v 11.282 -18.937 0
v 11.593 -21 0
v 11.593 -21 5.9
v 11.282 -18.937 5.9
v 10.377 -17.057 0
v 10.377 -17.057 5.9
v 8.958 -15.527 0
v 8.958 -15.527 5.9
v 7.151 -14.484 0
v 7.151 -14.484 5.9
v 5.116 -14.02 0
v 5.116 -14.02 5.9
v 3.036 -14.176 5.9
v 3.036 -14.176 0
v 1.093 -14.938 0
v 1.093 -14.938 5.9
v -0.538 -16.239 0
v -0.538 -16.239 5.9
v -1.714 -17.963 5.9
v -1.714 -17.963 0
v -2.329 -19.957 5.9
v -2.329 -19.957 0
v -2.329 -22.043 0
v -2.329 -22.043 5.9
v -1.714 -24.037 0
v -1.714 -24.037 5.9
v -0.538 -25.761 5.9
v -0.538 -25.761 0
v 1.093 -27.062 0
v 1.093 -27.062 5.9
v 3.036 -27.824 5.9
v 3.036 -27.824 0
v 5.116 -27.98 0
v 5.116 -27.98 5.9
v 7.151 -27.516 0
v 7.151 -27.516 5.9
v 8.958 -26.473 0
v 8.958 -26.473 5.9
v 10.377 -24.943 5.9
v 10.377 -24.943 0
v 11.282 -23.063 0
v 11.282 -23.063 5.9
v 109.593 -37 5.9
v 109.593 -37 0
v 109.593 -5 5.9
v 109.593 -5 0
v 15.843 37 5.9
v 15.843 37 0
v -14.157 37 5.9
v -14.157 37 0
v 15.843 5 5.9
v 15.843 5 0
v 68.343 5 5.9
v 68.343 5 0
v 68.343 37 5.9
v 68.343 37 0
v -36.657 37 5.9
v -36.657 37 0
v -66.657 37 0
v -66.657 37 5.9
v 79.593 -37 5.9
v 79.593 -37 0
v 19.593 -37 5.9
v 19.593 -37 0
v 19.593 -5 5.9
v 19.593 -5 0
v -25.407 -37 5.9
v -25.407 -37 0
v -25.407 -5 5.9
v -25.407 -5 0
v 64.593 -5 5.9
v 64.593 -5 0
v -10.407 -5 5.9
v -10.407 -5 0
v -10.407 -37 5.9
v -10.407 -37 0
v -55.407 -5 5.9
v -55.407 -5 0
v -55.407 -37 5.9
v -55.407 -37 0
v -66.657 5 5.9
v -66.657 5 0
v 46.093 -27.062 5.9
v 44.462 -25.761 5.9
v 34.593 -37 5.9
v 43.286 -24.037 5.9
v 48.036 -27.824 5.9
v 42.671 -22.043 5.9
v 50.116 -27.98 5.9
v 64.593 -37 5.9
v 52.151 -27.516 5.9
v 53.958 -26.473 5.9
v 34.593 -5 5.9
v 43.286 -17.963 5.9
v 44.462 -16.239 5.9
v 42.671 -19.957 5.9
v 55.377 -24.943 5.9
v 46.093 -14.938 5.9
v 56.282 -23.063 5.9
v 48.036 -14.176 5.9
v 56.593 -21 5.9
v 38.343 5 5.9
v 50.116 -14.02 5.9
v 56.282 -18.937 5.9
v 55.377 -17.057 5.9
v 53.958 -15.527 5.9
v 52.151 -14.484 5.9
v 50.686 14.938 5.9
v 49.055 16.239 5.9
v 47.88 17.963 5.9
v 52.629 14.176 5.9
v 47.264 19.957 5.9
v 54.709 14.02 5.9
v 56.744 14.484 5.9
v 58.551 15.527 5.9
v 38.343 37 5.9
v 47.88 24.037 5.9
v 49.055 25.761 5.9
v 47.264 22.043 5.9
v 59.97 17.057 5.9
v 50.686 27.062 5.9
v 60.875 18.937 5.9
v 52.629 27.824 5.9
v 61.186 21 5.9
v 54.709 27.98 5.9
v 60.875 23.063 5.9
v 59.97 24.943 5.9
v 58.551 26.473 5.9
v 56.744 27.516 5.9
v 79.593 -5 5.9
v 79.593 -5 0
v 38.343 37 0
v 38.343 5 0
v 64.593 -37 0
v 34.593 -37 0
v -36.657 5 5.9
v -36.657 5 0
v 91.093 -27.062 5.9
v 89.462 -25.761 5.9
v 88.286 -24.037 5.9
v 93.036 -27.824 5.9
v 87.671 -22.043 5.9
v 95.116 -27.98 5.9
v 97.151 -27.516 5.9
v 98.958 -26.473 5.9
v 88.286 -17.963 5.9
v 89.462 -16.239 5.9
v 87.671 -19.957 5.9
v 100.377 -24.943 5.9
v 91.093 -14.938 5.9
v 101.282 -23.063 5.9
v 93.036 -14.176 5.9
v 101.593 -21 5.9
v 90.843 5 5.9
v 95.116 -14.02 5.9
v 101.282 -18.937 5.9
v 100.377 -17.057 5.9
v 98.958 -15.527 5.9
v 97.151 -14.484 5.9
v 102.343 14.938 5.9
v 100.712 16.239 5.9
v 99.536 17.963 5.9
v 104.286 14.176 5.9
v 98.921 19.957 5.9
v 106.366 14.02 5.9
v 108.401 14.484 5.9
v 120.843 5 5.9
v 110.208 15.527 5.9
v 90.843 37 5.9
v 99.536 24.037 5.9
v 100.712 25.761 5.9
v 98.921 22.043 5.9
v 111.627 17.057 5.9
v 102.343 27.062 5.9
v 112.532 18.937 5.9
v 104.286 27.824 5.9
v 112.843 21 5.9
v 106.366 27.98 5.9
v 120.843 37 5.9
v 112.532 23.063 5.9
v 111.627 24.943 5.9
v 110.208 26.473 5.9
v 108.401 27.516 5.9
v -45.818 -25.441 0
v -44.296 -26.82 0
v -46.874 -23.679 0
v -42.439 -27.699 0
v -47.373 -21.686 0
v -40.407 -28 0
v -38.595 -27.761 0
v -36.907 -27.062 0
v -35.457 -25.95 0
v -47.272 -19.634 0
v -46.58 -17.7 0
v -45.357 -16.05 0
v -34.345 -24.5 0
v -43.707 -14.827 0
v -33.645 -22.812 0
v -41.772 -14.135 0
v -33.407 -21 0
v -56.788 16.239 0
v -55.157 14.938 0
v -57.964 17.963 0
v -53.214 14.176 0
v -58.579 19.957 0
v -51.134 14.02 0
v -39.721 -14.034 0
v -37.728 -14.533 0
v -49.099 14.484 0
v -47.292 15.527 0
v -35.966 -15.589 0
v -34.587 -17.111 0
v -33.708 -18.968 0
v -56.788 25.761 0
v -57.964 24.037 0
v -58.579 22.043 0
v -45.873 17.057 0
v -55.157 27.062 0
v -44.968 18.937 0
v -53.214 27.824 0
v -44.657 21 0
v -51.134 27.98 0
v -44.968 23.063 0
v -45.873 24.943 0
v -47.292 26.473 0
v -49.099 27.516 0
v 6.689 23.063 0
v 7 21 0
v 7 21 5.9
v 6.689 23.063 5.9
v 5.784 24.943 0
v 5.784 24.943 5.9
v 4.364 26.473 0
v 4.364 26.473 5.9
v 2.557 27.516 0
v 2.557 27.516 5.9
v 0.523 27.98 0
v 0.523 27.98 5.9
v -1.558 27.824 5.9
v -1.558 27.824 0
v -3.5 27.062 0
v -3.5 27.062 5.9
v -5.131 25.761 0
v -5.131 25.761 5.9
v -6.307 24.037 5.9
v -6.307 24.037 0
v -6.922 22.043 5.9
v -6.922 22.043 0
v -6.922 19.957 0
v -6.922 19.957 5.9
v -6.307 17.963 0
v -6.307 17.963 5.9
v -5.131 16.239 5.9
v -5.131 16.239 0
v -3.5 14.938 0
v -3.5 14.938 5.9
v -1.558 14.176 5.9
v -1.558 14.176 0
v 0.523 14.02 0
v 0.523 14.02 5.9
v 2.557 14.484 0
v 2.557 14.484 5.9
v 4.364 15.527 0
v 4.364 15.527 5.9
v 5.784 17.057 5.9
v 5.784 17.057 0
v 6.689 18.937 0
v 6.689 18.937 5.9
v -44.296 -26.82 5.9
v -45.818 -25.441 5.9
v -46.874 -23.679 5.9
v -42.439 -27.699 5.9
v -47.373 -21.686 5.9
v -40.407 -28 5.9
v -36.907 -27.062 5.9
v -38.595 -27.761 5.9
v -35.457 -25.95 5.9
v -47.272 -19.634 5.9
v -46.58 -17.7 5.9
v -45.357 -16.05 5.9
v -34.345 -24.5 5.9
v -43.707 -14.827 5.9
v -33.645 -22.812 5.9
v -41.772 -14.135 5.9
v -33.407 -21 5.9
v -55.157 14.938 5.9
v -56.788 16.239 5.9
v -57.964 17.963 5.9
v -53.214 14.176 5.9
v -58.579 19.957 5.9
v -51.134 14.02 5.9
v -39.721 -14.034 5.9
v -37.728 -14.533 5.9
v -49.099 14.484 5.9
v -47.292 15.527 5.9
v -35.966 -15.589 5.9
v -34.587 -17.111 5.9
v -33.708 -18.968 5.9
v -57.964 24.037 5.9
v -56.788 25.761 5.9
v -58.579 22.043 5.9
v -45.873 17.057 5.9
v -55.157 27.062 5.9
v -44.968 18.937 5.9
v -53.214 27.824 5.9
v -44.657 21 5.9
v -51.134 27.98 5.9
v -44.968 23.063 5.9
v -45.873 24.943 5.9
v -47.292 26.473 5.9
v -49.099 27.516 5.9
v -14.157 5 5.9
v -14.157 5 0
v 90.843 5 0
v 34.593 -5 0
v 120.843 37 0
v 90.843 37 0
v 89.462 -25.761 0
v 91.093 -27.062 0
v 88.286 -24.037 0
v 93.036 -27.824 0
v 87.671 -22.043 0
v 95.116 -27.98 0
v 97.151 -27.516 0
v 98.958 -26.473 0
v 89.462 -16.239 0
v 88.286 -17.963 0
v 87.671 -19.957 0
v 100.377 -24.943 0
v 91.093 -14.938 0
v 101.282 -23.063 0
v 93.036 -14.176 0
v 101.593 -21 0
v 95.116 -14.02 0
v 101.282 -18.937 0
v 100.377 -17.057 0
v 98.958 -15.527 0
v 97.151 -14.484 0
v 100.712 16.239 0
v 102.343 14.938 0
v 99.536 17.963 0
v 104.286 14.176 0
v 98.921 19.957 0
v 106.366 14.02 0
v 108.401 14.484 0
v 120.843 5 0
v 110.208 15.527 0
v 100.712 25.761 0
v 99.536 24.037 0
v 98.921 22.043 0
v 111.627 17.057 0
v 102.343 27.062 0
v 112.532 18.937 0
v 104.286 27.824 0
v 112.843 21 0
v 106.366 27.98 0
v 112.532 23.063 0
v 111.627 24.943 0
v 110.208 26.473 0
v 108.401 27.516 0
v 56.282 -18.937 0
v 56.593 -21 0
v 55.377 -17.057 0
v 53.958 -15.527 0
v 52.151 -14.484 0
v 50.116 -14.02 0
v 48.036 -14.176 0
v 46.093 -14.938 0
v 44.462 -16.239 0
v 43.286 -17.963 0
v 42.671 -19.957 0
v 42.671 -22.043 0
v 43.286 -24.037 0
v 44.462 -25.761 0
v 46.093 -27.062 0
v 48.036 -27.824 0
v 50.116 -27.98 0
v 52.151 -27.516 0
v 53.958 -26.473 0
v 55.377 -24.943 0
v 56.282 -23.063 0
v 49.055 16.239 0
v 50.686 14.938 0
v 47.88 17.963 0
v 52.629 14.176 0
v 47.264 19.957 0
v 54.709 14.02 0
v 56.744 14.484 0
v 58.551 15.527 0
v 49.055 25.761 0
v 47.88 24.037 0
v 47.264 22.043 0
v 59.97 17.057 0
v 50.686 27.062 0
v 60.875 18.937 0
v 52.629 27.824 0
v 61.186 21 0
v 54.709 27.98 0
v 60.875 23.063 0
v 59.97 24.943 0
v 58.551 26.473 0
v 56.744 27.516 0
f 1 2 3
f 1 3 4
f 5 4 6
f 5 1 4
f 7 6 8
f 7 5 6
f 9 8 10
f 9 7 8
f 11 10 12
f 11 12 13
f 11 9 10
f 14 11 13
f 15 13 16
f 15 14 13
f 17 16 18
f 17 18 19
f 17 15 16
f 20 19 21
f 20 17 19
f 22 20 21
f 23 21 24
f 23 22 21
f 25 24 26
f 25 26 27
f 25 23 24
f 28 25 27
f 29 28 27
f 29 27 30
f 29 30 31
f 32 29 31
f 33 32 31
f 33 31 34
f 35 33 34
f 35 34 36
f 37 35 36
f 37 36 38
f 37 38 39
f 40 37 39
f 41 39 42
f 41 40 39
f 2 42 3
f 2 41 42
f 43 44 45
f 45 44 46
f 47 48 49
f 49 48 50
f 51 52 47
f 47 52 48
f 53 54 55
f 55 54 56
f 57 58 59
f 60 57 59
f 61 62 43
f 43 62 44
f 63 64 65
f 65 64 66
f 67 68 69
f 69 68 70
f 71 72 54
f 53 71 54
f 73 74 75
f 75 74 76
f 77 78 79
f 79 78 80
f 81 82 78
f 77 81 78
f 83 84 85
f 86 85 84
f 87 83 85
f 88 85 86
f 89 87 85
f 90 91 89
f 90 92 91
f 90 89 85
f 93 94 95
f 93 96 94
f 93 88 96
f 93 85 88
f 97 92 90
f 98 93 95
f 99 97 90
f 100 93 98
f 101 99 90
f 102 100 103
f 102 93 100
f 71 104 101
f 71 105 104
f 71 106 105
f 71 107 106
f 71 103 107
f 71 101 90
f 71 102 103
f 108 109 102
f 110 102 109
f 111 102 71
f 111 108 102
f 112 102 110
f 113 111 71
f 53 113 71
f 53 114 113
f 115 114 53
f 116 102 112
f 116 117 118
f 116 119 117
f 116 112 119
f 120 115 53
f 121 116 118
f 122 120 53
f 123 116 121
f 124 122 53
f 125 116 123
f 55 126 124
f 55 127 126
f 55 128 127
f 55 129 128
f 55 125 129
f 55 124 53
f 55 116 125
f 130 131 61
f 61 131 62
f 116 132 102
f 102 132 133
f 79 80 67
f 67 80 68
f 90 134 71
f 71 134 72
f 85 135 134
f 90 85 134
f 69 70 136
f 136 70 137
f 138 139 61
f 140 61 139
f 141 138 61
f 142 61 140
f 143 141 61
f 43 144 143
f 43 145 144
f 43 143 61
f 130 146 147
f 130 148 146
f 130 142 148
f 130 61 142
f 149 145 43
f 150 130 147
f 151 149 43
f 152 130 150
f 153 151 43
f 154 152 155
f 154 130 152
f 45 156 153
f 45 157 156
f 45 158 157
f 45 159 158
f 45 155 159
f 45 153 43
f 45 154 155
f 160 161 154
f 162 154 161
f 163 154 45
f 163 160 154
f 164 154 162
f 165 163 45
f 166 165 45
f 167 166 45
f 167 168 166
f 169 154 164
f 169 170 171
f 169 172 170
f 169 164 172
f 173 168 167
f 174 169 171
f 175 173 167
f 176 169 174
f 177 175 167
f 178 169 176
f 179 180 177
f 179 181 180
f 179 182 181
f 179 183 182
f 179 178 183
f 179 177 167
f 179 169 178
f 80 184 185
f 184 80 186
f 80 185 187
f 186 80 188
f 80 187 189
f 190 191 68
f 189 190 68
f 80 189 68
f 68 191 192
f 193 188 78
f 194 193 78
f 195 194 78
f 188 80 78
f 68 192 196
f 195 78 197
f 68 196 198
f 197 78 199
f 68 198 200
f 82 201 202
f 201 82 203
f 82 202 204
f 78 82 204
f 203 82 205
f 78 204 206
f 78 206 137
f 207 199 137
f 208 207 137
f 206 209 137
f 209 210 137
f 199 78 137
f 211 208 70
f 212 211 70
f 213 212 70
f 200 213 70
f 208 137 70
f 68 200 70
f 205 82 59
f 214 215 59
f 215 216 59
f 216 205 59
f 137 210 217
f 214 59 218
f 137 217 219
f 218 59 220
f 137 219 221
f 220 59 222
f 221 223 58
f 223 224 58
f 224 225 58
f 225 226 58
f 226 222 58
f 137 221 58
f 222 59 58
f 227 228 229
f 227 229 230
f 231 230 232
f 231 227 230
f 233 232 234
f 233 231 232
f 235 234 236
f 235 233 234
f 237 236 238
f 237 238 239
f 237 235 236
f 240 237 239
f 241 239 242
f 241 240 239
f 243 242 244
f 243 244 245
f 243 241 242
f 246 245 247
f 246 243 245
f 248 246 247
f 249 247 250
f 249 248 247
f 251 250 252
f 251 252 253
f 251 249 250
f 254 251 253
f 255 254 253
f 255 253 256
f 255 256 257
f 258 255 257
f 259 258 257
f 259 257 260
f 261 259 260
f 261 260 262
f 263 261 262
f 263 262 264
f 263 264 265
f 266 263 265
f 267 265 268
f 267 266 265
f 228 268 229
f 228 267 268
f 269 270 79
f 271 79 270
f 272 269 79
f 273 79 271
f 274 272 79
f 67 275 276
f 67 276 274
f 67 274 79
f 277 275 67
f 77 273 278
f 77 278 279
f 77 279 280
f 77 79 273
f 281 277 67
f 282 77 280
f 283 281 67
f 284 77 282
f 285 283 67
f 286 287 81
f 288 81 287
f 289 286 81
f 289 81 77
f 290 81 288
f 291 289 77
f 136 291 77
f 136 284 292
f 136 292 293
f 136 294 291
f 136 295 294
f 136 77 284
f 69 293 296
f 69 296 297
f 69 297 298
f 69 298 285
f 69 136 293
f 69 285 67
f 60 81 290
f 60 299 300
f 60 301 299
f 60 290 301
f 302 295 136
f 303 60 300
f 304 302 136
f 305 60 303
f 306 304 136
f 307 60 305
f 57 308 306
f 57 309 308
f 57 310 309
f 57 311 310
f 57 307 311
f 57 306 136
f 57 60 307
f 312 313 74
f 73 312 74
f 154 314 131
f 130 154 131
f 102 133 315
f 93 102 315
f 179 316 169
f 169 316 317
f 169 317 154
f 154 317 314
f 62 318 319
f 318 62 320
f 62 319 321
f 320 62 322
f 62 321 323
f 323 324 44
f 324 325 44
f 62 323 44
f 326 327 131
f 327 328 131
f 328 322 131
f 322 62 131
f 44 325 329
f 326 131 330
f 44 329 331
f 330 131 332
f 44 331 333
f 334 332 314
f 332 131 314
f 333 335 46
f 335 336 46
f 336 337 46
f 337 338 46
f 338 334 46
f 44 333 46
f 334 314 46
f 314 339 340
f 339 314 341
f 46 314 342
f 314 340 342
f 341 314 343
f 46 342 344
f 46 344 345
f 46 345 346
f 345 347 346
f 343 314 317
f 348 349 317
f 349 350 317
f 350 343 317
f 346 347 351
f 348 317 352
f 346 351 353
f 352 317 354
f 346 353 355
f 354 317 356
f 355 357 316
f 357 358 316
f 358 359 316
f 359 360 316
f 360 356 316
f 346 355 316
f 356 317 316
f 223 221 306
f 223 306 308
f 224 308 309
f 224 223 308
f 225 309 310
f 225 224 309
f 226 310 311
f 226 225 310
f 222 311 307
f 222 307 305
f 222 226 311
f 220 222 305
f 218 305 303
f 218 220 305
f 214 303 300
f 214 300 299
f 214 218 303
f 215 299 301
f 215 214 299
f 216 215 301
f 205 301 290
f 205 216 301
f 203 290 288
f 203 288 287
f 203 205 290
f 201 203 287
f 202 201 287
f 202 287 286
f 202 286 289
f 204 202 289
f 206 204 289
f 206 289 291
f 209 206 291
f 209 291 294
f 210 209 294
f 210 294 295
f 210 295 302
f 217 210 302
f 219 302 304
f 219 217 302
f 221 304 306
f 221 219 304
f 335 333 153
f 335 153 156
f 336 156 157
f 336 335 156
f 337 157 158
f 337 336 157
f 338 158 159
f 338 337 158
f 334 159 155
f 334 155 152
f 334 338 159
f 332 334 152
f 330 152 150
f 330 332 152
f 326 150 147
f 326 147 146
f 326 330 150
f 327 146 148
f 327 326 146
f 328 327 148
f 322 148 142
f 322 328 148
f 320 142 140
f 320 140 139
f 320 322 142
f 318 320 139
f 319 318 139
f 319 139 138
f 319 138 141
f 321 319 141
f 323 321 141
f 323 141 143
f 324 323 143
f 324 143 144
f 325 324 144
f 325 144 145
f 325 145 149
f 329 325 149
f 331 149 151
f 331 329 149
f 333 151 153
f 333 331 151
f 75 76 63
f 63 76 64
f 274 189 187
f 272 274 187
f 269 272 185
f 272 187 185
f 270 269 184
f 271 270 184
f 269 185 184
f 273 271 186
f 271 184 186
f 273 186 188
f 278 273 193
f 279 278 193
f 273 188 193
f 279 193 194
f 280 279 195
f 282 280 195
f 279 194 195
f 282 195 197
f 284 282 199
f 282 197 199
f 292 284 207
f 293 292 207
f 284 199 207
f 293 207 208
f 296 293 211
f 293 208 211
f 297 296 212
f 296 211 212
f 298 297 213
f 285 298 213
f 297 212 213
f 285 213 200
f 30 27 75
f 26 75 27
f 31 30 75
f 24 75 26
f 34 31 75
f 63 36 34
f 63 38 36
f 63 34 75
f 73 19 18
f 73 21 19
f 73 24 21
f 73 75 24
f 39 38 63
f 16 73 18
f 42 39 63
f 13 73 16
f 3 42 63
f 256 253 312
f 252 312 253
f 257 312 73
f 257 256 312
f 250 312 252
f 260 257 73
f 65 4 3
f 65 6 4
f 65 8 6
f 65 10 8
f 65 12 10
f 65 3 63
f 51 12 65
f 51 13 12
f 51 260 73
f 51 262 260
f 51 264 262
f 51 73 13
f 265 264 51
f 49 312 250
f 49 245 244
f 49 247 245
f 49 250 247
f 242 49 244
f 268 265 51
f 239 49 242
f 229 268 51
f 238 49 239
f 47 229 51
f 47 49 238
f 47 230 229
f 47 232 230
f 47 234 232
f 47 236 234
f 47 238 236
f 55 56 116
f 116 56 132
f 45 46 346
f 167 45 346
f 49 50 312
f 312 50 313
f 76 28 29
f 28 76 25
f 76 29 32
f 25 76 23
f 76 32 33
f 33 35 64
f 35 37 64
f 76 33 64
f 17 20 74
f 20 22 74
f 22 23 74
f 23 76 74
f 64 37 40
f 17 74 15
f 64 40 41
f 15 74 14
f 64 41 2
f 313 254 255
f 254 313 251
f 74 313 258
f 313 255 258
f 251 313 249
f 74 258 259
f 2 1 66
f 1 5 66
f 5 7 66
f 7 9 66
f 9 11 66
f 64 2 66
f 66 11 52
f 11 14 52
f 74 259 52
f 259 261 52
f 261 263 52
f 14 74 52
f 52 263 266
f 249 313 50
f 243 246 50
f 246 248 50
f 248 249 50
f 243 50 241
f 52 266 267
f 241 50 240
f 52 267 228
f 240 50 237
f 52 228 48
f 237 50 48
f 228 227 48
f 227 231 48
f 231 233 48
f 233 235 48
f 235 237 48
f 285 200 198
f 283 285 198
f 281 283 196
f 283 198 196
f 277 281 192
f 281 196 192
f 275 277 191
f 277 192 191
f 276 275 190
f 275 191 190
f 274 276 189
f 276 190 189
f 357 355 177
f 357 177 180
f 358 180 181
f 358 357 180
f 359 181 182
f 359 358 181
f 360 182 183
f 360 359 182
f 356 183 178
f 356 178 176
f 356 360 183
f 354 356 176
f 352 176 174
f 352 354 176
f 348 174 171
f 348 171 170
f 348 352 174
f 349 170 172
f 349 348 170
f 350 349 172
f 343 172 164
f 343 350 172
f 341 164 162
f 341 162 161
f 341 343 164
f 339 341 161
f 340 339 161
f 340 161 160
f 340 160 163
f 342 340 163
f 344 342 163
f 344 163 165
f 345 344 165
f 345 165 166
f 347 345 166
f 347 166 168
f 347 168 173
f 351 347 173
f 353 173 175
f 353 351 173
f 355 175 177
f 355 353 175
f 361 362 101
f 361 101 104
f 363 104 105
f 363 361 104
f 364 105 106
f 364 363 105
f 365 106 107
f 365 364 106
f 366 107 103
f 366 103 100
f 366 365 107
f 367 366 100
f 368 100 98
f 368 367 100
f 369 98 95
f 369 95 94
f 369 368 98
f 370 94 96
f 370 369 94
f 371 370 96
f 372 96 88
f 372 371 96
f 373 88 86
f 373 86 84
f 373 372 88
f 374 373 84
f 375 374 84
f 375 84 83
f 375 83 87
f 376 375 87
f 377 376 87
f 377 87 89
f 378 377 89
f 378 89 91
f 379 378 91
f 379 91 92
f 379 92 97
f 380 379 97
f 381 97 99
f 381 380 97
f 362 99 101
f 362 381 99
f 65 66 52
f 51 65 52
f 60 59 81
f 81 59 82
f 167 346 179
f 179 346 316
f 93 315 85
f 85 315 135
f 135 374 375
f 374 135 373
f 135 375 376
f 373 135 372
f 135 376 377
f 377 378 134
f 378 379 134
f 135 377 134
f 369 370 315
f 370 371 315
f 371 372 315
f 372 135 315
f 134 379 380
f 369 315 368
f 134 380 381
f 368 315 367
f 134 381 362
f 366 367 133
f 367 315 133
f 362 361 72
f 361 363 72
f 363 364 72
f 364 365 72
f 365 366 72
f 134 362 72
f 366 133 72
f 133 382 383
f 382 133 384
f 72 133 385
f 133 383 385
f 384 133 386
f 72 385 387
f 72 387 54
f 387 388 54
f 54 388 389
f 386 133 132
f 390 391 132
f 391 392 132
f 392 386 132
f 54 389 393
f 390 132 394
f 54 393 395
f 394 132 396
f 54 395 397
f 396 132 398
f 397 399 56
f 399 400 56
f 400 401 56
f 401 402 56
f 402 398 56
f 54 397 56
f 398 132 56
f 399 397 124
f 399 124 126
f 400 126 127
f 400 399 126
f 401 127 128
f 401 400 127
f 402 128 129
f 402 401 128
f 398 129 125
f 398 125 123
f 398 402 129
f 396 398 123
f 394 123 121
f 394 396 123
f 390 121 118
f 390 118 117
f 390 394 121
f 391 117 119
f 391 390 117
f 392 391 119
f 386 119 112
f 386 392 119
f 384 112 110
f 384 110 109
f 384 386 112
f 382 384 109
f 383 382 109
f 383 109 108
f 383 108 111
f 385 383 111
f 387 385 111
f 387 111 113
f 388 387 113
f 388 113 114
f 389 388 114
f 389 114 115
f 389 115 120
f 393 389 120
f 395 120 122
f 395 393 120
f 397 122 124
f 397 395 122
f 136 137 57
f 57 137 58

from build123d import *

# Parameters (mm, degrees)
F0_R     = 7
F1_DEPTH = 5.9


with BuildPart() as f1:
    # F0 (on Top) → F1 (new body)
    with BuildSketch(Plane.XY):
        Polygon((-36.656843, 5), (-36.656843, 37), (-66.656843, 37), (-66.656843, 5), (-55.406843, -5), (-55.406843, -37), (-40.406843, -37), (-25.406843, -37), (-25.406843, -5), align=None)
        with BuildLine():
            ThreePointArc((-33.406843, -21), (-35.457095, -25.949747), (-40.406843, -28))
            ThreePointArc((-40.406843, -28), (-45.35659, -16.050253), (-33.406843, -21))
        make_face(mode=Mode.SUBTRACT)
        with Locations((-51.656843, 21)):
            Circle(F0_R, mode=Mode.SUBTRACT)
        Polygon((15.843157, 5), (15.843157, 37), (-14.156843, 37), (-14.156843, 5), (-10.406843, -5), (-10.406843, -37), (19.593157, -37), (19.593157, -5), align=None)
        with Locations((4.593157, -21)):
            Circle(F0_R, mode=Mode.SUBTRACT)
        with Locations((0, 21)):
            Circle(F0_R, mode=Mode.SUBTRACT)
        Polygon((68.343157, 5), (68.343157, 37), (38.343157, 37), (38.343157, 5), (34.593157, -5), (34.593157, -37), (64.593157, -37), (64.593157, -5), align=None)
        with Locations((49.593157, -21)):
            Circle(F0_R, mode=Mode.SUBTRACT)
        with Locations((54.186315, 21)):
            Circle(F0_R, mode=Mode.SUBTRACT)
        Polygon((120.843157, 37), (90.843157, 37), (90.843157, 5), (79.593157, -5), (79.593157, -37), (109.593157, -37), (109.593157, -5), (120.843157, 5), align=None)
        with Locations((94.593157, -21)):
            Circle(F0_R, mode=Mode.SUBTRACT)
        with Locations((105.843157, 21)):
            Circle(F0_R, mode=Mode.SUBTRACT)
    extrude(amount=F1_DEPTH)


solid = f1.part
